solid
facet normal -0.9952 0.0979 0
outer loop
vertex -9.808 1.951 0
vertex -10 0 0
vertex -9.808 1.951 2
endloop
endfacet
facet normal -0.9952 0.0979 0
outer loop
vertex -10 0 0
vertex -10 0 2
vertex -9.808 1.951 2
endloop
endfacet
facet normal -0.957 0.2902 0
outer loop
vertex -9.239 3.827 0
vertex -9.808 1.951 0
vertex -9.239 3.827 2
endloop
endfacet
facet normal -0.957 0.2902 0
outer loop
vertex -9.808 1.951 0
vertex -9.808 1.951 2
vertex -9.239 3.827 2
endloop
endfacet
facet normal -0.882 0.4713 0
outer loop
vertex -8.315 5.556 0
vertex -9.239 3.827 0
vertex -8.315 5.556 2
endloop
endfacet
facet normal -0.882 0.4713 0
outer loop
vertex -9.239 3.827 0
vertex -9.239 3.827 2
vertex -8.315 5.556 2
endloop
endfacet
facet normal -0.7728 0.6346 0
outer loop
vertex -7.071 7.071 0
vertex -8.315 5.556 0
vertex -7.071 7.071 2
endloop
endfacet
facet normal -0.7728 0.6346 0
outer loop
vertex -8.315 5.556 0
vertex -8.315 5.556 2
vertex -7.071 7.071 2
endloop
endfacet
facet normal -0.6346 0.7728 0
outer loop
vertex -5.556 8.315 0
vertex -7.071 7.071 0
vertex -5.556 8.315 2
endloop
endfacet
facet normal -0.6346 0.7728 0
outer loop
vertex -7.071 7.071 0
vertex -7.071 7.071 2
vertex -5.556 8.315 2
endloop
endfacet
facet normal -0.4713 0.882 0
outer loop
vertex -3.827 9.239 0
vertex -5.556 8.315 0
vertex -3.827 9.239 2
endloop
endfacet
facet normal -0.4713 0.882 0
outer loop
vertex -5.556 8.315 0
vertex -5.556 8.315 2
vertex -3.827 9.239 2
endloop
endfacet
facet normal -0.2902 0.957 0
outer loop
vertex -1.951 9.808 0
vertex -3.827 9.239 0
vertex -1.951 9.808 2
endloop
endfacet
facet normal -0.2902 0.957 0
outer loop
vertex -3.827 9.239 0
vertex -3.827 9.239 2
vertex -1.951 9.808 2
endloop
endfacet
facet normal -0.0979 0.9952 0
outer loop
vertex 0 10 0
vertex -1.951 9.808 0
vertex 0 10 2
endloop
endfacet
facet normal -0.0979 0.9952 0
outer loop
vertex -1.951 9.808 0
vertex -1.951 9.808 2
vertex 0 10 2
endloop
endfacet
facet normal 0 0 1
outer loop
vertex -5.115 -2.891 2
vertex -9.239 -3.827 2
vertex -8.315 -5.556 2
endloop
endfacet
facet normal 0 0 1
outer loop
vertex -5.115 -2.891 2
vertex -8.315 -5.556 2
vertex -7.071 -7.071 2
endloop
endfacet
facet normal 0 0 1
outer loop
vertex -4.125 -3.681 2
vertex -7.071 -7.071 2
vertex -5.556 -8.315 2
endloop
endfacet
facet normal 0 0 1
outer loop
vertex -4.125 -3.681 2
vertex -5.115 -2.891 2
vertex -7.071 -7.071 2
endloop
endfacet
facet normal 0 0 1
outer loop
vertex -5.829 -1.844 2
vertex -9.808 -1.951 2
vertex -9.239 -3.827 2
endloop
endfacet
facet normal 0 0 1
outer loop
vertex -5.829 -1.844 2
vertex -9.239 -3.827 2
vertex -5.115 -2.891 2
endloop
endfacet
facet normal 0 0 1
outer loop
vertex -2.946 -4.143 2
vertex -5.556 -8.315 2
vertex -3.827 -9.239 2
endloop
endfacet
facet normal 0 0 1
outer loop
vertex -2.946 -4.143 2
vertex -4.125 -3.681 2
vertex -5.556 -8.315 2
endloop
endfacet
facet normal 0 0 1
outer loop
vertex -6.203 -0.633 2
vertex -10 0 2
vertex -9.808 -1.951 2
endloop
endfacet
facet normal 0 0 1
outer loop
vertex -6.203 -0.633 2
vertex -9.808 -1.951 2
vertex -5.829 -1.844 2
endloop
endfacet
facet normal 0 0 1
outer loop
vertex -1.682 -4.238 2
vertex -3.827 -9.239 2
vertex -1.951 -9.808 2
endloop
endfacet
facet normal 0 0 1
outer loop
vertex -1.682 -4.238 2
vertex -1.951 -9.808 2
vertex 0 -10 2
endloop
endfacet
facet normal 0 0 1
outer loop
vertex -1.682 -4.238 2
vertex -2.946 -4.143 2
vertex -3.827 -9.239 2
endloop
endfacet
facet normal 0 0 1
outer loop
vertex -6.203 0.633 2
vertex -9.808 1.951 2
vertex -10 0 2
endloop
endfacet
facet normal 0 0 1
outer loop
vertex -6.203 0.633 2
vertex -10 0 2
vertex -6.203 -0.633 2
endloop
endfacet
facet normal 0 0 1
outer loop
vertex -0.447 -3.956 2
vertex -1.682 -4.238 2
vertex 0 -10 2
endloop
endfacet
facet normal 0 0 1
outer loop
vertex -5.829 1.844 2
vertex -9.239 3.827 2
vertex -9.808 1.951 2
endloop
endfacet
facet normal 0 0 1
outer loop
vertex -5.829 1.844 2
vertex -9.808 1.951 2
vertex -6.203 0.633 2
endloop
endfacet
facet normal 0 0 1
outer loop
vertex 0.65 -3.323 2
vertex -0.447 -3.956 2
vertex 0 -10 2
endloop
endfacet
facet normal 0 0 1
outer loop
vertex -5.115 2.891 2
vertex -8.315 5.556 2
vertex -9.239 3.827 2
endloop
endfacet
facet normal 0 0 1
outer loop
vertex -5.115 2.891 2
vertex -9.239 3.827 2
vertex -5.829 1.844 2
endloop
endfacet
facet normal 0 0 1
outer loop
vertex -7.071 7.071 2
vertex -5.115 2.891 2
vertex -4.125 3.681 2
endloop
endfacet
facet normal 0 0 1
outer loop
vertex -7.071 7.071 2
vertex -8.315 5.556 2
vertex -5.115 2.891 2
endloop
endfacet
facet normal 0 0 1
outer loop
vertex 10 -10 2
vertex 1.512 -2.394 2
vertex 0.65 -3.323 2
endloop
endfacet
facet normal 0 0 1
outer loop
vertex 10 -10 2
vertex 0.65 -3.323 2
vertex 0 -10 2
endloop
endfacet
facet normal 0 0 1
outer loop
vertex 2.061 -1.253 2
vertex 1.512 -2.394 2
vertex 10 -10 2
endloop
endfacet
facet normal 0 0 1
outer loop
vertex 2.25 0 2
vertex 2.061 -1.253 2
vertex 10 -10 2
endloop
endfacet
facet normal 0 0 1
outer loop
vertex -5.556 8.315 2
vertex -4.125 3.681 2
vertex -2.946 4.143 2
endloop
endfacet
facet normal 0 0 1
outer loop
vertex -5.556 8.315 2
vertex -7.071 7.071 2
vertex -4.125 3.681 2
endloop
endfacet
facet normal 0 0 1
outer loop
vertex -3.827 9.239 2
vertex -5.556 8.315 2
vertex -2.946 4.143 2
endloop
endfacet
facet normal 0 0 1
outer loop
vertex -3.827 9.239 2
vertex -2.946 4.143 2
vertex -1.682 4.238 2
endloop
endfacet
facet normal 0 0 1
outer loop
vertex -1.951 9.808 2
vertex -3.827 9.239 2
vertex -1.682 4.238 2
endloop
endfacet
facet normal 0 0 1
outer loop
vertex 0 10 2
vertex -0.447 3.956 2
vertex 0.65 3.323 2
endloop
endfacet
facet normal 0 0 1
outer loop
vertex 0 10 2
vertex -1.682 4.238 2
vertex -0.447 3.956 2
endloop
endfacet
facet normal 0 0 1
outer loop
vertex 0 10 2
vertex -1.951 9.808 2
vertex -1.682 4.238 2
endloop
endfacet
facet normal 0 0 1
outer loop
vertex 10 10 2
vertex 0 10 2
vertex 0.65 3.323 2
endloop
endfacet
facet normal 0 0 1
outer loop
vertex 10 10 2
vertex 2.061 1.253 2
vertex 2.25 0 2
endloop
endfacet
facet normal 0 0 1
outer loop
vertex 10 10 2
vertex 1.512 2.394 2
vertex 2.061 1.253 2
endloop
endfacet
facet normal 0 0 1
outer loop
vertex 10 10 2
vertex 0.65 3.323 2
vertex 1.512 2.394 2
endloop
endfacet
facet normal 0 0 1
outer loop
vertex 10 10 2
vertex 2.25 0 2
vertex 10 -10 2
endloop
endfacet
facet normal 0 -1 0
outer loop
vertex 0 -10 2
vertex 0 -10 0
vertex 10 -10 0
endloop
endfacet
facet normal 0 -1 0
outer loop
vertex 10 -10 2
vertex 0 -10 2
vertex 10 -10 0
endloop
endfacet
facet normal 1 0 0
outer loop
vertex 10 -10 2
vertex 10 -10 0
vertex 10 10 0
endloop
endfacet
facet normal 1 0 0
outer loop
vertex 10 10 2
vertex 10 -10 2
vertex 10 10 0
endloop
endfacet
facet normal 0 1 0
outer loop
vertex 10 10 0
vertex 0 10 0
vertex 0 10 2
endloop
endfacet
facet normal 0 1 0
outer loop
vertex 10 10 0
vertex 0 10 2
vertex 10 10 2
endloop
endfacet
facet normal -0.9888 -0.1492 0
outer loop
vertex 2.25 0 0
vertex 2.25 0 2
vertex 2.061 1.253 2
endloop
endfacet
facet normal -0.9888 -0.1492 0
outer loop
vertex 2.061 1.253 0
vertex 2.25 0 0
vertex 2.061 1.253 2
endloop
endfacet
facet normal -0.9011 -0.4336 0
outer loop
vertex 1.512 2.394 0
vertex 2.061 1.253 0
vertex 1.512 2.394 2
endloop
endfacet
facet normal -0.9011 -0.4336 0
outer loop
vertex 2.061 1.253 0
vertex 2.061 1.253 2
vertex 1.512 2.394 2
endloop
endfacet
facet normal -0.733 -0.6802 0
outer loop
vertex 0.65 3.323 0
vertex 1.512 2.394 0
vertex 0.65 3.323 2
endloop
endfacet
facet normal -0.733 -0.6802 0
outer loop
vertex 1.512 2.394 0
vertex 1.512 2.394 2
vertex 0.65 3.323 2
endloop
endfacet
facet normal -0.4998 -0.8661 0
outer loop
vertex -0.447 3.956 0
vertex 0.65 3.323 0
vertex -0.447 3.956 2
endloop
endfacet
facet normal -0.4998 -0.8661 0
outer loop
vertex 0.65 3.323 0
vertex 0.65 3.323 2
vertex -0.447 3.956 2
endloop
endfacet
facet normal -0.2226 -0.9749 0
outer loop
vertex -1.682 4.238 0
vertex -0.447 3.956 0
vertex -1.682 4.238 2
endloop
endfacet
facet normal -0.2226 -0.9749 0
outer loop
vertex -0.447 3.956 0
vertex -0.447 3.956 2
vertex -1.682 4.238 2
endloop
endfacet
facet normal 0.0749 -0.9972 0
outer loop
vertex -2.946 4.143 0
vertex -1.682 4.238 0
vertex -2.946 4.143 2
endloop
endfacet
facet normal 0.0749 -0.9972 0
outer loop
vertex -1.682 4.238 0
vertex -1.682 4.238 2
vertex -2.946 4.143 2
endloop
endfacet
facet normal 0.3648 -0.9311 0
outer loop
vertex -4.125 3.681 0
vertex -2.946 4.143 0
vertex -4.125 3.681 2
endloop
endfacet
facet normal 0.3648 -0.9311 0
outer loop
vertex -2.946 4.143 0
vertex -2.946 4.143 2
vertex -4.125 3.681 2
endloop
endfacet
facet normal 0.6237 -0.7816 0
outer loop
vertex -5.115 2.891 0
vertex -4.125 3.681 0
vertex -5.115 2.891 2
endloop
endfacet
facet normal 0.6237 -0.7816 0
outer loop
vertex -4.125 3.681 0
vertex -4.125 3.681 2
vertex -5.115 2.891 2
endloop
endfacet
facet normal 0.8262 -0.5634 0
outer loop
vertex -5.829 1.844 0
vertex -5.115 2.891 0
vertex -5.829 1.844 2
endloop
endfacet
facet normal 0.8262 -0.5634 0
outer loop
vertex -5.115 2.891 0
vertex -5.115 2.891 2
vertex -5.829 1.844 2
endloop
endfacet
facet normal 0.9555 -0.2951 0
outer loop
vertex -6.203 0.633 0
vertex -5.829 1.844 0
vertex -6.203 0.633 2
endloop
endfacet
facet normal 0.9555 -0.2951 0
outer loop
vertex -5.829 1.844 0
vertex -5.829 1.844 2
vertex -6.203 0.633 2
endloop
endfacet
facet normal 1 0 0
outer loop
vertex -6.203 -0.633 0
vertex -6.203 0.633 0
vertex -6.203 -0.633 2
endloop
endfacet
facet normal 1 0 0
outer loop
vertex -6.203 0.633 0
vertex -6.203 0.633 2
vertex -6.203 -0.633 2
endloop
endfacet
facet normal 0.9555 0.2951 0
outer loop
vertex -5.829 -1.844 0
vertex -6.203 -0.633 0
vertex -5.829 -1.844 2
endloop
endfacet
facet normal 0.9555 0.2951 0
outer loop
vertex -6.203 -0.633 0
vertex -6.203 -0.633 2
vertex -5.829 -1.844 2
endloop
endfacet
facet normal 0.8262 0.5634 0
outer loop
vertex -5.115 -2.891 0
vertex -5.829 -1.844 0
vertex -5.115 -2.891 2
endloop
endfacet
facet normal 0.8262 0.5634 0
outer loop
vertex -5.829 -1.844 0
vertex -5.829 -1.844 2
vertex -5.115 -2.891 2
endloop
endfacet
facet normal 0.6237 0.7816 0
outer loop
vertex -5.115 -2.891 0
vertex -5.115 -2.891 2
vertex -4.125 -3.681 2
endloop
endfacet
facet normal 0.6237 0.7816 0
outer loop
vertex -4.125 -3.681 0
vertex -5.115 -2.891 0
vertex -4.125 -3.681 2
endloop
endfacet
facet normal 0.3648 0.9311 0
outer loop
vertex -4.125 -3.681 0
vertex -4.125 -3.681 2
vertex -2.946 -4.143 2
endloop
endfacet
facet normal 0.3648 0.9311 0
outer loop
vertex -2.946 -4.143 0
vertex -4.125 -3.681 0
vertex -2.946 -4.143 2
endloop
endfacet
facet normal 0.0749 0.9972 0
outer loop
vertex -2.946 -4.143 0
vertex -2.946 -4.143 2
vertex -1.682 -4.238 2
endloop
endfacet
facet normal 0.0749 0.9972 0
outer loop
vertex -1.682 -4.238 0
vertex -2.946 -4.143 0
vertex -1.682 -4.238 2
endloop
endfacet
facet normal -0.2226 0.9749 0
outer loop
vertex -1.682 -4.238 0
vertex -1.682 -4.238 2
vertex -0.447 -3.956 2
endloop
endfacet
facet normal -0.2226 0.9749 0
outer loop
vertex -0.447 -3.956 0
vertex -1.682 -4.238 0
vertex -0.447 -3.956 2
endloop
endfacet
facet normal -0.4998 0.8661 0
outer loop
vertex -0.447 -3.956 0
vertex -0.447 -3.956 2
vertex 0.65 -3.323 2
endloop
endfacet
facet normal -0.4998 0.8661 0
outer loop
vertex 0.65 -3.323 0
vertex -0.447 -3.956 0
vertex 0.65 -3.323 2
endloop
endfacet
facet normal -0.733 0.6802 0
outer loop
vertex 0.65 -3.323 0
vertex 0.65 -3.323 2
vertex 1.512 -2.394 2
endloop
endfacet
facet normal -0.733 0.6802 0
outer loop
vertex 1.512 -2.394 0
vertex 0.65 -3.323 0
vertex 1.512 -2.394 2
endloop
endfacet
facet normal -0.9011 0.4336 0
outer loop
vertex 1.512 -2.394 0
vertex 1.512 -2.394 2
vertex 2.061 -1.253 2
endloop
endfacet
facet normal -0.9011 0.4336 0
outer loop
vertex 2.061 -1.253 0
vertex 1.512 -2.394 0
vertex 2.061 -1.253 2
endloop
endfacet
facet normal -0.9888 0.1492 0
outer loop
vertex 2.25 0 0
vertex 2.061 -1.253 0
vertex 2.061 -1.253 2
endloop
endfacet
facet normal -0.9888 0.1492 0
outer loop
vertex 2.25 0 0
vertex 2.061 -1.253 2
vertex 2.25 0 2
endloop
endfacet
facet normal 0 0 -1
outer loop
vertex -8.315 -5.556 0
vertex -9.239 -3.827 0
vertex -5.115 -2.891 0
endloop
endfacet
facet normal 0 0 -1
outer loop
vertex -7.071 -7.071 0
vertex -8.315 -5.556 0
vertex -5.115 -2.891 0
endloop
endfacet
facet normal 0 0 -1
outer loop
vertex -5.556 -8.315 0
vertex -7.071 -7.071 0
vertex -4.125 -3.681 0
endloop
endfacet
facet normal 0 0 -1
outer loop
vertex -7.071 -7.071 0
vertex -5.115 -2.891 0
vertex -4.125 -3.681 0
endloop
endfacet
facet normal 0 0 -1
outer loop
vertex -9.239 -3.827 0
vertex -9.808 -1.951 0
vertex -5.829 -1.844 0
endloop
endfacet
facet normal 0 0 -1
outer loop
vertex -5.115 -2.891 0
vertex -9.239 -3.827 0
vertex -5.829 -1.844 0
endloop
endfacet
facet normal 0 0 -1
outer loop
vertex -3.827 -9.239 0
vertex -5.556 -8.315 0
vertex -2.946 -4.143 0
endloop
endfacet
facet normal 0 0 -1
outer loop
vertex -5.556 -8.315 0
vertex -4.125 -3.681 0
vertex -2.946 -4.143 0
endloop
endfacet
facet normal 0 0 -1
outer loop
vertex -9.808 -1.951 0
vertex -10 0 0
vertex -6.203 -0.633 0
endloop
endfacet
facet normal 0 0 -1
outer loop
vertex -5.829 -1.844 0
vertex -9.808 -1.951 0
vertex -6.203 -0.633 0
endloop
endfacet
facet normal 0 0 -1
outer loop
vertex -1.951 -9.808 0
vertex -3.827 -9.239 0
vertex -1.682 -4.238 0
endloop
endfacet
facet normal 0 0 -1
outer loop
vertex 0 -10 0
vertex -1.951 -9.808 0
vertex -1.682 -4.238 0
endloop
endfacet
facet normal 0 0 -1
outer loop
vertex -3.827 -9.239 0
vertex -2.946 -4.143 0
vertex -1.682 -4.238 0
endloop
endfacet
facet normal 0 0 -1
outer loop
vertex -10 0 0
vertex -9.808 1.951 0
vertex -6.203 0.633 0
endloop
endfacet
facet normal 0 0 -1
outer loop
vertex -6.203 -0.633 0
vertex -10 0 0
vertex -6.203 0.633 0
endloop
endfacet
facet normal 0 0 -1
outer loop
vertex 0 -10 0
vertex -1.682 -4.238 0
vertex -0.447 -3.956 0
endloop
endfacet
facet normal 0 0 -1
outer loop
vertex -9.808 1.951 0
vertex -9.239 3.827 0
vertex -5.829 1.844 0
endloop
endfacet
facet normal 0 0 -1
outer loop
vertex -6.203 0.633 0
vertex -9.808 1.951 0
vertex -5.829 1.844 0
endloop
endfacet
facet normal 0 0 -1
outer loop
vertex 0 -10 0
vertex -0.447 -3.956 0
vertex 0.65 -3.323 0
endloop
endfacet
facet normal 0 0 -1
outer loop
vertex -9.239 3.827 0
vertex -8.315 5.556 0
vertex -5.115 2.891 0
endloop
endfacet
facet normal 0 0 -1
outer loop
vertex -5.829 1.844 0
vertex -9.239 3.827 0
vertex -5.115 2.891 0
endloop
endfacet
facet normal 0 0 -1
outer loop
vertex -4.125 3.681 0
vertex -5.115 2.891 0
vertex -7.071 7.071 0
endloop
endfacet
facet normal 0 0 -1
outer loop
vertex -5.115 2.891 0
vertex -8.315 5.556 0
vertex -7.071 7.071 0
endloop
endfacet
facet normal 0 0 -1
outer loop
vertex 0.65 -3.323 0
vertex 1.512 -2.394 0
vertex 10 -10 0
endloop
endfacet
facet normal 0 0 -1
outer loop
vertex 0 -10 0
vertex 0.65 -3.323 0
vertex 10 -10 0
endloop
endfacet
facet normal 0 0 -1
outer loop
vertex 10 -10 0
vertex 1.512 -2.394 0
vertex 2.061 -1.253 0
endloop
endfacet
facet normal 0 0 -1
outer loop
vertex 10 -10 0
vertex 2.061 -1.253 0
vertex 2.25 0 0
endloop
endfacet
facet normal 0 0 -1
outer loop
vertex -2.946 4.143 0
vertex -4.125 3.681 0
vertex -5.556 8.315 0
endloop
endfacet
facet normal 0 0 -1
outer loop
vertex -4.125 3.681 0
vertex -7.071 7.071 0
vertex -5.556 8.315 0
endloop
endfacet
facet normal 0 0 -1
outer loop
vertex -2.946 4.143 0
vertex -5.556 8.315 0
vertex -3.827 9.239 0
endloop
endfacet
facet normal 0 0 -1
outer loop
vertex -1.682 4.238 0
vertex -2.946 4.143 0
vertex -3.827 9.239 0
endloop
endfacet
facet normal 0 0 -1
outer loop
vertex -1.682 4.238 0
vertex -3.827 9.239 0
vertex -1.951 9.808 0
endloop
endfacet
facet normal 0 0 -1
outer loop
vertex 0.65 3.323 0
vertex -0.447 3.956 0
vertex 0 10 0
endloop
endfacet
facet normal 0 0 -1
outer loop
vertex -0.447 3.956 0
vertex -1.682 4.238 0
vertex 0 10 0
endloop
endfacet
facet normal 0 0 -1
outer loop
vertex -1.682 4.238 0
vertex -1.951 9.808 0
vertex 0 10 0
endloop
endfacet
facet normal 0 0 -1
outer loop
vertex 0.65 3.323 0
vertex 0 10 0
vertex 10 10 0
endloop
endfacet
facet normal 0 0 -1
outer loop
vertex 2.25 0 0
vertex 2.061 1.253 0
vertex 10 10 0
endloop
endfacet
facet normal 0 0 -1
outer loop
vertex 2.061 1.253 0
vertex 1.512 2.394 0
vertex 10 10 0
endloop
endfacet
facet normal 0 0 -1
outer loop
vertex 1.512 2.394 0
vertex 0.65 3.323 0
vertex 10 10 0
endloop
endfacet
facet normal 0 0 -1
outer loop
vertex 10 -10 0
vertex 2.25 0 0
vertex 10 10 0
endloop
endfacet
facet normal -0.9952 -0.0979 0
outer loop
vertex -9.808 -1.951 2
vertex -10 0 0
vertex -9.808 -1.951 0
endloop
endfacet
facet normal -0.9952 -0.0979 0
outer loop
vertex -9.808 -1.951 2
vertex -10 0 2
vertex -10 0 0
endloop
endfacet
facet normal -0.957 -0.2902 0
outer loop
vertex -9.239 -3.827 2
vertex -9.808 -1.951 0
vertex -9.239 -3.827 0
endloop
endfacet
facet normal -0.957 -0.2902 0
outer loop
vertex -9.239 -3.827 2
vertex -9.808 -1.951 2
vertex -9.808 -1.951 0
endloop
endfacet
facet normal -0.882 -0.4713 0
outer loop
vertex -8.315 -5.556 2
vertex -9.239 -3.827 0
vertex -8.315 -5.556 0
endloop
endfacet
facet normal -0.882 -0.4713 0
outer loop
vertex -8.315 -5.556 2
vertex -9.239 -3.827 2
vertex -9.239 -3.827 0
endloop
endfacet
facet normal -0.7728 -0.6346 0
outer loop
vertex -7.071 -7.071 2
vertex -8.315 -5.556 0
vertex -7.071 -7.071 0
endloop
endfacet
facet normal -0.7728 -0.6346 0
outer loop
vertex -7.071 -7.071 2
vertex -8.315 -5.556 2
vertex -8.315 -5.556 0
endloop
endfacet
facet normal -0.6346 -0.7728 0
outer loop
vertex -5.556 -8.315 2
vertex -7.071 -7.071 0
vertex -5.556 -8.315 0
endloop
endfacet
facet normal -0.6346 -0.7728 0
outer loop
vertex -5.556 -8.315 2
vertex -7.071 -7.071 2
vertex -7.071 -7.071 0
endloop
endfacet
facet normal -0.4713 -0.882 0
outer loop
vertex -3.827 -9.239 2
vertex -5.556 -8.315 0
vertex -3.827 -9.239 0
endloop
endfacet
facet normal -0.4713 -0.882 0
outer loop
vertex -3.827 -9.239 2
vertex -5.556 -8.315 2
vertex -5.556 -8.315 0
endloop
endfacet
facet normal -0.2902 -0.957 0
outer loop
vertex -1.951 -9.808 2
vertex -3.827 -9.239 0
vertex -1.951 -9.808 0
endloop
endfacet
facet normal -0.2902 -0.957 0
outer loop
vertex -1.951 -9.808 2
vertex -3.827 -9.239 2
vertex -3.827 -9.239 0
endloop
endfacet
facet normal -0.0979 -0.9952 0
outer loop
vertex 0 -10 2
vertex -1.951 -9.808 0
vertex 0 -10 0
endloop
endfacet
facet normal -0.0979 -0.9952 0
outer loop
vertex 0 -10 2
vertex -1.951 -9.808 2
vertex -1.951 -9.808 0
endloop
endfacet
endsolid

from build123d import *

# Parameters (mm, degrees)
SKETCH2_W           = 20
SKETCH2_H           = 20
BOSS_EXTRUDE1_DEPTH = 2
SKETCH3_R           = 4.25
CUT_EXTRUDE1_DEPTH  = 15.282856857
FILLET1_R           = 10


with BuildPart() as part:
    # Sketch2 → Boss-Extrude1 (new body)
    with BuildSketch(Plane.XY):
        Rectangle(SKETCH2_W, SKETCH2_H)
    extrude(amount=BOSS_EXTRUDE1_DEPTH)

    # Sketch3 → Cut-Extrude1 (cut, through all)
    with BuildSketch(Plane.XY.offset(2)):
        with Locations((-2, 0)):
            Circle(SKETCH3_R)
    extrude(amount=-CUT_EXTRUDE1_DEPTH, mode=Mode.SUBTRACT)

    # Fillet1
    fillet1_edges = [part.edges().sort_by_distance(p)[0] for p in [
        (-10, -10, 1),
        (-10, 10, 1),
    ]]
    fillet(fillet1_edges, radius=FILLET1_R - 0.0001)  # a hair under: the kernel refuses the full size


solid = part.part
